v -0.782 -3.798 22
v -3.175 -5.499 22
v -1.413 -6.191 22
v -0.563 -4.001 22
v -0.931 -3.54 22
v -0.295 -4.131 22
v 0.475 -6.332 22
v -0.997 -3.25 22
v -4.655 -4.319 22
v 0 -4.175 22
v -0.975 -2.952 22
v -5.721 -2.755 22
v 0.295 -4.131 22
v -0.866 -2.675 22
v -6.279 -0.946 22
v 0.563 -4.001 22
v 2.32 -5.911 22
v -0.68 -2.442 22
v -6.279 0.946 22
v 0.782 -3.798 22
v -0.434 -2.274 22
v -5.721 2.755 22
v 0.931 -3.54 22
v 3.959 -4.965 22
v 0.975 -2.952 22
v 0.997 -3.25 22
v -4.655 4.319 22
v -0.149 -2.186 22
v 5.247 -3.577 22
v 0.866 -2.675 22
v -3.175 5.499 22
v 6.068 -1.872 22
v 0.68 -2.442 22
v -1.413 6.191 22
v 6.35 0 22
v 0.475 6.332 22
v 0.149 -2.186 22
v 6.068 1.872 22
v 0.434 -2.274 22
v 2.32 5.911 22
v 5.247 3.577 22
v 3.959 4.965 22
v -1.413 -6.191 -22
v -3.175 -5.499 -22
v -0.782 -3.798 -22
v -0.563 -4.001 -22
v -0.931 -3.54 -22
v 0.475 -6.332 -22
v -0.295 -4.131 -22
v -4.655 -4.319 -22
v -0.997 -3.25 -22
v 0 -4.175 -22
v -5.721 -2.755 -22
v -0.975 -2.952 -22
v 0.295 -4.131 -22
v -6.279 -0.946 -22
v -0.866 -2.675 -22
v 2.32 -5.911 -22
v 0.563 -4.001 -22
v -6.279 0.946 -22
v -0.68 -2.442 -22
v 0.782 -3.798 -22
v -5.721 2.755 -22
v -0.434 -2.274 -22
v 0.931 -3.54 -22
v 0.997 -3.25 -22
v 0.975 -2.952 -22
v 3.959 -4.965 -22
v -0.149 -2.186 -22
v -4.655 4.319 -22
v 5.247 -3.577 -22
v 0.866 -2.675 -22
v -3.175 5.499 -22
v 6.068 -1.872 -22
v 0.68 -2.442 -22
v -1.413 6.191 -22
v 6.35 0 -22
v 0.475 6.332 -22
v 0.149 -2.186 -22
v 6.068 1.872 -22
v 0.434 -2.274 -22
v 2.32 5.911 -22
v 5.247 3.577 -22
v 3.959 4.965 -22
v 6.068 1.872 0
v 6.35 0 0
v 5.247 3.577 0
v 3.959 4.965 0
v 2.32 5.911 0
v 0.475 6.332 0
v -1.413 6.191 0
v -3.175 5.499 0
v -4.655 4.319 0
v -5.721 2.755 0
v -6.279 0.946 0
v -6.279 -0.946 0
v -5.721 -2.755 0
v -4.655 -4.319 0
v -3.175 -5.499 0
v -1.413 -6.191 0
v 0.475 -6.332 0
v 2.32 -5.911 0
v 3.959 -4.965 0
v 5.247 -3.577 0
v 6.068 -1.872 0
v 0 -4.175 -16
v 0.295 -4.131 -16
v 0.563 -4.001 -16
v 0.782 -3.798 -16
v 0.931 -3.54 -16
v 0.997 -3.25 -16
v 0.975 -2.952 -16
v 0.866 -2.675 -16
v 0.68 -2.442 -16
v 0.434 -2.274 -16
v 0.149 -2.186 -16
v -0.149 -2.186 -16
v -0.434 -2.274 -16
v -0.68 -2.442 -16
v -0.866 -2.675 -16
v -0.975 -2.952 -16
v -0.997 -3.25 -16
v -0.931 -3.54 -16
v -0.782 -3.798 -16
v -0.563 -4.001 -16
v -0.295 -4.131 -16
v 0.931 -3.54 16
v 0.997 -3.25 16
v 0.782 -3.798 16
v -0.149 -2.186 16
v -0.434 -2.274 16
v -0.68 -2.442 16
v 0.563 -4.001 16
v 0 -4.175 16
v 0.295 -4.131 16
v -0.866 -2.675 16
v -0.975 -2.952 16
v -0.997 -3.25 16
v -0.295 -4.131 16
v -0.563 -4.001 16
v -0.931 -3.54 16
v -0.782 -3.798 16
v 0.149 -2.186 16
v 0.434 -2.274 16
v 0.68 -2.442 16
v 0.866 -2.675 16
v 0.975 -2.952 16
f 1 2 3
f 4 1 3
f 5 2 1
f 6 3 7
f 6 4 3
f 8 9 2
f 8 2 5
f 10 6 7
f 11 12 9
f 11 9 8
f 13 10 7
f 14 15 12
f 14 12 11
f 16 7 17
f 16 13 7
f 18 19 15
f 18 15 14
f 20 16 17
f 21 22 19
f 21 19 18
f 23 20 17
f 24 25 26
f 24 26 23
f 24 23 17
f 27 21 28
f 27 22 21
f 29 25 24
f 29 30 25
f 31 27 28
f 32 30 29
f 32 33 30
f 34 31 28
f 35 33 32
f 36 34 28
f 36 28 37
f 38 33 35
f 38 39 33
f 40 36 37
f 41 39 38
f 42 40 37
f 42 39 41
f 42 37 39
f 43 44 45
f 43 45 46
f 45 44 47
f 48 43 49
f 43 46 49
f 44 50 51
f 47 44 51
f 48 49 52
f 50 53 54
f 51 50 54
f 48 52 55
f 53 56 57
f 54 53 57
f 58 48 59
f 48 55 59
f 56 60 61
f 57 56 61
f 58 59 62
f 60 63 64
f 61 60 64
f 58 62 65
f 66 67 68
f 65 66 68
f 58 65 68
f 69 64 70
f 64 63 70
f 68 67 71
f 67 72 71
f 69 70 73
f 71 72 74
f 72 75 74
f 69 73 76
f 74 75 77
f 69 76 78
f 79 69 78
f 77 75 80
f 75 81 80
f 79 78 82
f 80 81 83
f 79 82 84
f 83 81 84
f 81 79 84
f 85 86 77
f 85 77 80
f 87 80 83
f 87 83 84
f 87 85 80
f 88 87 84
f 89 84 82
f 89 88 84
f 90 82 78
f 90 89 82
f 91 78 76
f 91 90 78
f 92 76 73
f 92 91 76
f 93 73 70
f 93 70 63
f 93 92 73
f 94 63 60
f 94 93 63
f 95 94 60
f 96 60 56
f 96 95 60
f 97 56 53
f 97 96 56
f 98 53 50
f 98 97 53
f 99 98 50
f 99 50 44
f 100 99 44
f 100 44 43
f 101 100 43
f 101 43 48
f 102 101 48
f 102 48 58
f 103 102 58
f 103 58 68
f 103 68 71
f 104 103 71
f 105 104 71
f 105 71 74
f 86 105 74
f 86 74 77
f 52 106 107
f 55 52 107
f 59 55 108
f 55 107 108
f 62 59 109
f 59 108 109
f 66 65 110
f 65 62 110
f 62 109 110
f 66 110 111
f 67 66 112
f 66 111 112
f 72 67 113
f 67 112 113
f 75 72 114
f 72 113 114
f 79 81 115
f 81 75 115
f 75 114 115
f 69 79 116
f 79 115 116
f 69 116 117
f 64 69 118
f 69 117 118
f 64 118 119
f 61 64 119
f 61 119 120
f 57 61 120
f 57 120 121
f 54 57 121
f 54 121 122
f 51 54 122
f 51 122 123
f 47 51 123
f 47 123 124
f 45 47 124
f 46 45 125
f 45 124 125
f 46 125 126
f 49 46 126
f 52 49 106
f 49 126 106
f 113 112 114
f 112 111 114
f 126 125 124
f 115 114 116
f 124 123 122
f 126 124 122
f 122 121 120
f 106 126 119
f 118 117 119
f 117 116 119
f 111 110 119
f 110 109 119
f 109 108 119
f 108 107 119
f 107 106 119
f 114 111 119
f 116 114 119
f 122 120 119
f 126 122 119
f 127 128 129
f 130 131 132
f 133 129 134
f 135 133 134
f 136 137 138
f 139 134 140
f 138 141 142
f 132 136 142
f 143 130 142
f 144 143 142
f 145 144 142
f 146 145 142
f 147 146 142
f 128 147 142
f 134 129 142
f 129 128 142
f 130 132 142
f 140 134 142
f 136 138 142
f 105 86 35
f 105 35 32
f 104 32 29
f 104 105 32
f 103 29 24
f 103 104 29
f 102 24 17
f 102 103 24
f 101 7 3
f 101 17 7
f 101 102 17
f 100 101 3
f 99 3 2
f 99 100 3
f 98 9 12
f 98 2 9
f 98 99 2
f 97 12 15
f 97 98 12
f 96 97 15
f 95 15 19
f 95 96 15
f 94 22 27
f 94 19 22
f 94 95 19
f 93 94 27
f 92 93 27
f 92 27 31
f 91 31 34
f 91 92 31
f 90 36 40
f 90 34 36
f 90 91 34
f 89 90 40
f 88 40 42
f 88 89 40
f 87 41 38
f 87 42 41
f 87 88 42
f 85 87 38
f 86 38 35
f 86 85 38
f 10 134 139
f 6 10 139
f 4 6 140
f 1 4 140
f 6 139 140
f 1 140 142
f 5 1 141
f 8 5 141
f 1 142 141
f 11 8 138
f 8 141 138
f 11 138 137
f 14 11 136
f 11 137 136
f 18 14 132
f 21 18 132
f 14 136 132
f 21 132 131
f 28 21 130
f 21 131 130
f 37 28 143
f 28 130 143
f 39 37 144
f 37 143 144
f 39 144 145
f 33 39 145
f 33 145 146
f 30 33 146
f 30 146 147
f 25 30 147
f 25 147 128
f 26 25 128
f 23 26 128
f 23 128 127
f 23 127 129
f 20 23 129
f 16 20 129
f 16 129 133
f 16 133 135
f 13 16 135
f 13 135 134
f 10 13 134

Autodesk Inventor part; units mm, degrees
ref_plane "YZ Plane" through (0, 0, 0) normal (1, 0, 0) x (0, 1, 0)
ref_plane "XZ Plane" through (0, 0, 0) normal (0, 1, 0) x (-1, 0, 0)
ref_plane "XY Plane" through (0, 0, 0) normal (0, 0, 1) x (1, 0, 0)
sketch "Sketch1" plane through (0, 0, 0) normal (0, 0, 1) x (1, 0, 0)
  circle A0 centre (0, 0) radius 6.35
  dimension "d2" = 12.7
extrude "Extrusion1" add sketch "Sketch1" along normal mid plane 44
sketch "Sketch2" plane through (0, 0, 22) normal (0, 0, 1) x (1, 0, 0)
  circle A0 centre (0, -3.175) radius 1
  point P0 (0, 0)
  dimension "d3" = 2
  dimension "d4" = 3.175
hole "Hole1" at (0, -3.175, 22) direction (0, 0, -1) diameter 2 depth 6
mirror "Mirror1" about plane through (0, 0, 0) normal (0, 0, 1) of "Hole1"
thread "Thread1" size "M2x0.4" class "6H" standard "ANSI Metric M Profile" full length
thread "Thread2" size "M2x0.4" class "6H" standard "ANSI Metric M Profile" full length
properties part number "Tubo Soporte para Corte"
